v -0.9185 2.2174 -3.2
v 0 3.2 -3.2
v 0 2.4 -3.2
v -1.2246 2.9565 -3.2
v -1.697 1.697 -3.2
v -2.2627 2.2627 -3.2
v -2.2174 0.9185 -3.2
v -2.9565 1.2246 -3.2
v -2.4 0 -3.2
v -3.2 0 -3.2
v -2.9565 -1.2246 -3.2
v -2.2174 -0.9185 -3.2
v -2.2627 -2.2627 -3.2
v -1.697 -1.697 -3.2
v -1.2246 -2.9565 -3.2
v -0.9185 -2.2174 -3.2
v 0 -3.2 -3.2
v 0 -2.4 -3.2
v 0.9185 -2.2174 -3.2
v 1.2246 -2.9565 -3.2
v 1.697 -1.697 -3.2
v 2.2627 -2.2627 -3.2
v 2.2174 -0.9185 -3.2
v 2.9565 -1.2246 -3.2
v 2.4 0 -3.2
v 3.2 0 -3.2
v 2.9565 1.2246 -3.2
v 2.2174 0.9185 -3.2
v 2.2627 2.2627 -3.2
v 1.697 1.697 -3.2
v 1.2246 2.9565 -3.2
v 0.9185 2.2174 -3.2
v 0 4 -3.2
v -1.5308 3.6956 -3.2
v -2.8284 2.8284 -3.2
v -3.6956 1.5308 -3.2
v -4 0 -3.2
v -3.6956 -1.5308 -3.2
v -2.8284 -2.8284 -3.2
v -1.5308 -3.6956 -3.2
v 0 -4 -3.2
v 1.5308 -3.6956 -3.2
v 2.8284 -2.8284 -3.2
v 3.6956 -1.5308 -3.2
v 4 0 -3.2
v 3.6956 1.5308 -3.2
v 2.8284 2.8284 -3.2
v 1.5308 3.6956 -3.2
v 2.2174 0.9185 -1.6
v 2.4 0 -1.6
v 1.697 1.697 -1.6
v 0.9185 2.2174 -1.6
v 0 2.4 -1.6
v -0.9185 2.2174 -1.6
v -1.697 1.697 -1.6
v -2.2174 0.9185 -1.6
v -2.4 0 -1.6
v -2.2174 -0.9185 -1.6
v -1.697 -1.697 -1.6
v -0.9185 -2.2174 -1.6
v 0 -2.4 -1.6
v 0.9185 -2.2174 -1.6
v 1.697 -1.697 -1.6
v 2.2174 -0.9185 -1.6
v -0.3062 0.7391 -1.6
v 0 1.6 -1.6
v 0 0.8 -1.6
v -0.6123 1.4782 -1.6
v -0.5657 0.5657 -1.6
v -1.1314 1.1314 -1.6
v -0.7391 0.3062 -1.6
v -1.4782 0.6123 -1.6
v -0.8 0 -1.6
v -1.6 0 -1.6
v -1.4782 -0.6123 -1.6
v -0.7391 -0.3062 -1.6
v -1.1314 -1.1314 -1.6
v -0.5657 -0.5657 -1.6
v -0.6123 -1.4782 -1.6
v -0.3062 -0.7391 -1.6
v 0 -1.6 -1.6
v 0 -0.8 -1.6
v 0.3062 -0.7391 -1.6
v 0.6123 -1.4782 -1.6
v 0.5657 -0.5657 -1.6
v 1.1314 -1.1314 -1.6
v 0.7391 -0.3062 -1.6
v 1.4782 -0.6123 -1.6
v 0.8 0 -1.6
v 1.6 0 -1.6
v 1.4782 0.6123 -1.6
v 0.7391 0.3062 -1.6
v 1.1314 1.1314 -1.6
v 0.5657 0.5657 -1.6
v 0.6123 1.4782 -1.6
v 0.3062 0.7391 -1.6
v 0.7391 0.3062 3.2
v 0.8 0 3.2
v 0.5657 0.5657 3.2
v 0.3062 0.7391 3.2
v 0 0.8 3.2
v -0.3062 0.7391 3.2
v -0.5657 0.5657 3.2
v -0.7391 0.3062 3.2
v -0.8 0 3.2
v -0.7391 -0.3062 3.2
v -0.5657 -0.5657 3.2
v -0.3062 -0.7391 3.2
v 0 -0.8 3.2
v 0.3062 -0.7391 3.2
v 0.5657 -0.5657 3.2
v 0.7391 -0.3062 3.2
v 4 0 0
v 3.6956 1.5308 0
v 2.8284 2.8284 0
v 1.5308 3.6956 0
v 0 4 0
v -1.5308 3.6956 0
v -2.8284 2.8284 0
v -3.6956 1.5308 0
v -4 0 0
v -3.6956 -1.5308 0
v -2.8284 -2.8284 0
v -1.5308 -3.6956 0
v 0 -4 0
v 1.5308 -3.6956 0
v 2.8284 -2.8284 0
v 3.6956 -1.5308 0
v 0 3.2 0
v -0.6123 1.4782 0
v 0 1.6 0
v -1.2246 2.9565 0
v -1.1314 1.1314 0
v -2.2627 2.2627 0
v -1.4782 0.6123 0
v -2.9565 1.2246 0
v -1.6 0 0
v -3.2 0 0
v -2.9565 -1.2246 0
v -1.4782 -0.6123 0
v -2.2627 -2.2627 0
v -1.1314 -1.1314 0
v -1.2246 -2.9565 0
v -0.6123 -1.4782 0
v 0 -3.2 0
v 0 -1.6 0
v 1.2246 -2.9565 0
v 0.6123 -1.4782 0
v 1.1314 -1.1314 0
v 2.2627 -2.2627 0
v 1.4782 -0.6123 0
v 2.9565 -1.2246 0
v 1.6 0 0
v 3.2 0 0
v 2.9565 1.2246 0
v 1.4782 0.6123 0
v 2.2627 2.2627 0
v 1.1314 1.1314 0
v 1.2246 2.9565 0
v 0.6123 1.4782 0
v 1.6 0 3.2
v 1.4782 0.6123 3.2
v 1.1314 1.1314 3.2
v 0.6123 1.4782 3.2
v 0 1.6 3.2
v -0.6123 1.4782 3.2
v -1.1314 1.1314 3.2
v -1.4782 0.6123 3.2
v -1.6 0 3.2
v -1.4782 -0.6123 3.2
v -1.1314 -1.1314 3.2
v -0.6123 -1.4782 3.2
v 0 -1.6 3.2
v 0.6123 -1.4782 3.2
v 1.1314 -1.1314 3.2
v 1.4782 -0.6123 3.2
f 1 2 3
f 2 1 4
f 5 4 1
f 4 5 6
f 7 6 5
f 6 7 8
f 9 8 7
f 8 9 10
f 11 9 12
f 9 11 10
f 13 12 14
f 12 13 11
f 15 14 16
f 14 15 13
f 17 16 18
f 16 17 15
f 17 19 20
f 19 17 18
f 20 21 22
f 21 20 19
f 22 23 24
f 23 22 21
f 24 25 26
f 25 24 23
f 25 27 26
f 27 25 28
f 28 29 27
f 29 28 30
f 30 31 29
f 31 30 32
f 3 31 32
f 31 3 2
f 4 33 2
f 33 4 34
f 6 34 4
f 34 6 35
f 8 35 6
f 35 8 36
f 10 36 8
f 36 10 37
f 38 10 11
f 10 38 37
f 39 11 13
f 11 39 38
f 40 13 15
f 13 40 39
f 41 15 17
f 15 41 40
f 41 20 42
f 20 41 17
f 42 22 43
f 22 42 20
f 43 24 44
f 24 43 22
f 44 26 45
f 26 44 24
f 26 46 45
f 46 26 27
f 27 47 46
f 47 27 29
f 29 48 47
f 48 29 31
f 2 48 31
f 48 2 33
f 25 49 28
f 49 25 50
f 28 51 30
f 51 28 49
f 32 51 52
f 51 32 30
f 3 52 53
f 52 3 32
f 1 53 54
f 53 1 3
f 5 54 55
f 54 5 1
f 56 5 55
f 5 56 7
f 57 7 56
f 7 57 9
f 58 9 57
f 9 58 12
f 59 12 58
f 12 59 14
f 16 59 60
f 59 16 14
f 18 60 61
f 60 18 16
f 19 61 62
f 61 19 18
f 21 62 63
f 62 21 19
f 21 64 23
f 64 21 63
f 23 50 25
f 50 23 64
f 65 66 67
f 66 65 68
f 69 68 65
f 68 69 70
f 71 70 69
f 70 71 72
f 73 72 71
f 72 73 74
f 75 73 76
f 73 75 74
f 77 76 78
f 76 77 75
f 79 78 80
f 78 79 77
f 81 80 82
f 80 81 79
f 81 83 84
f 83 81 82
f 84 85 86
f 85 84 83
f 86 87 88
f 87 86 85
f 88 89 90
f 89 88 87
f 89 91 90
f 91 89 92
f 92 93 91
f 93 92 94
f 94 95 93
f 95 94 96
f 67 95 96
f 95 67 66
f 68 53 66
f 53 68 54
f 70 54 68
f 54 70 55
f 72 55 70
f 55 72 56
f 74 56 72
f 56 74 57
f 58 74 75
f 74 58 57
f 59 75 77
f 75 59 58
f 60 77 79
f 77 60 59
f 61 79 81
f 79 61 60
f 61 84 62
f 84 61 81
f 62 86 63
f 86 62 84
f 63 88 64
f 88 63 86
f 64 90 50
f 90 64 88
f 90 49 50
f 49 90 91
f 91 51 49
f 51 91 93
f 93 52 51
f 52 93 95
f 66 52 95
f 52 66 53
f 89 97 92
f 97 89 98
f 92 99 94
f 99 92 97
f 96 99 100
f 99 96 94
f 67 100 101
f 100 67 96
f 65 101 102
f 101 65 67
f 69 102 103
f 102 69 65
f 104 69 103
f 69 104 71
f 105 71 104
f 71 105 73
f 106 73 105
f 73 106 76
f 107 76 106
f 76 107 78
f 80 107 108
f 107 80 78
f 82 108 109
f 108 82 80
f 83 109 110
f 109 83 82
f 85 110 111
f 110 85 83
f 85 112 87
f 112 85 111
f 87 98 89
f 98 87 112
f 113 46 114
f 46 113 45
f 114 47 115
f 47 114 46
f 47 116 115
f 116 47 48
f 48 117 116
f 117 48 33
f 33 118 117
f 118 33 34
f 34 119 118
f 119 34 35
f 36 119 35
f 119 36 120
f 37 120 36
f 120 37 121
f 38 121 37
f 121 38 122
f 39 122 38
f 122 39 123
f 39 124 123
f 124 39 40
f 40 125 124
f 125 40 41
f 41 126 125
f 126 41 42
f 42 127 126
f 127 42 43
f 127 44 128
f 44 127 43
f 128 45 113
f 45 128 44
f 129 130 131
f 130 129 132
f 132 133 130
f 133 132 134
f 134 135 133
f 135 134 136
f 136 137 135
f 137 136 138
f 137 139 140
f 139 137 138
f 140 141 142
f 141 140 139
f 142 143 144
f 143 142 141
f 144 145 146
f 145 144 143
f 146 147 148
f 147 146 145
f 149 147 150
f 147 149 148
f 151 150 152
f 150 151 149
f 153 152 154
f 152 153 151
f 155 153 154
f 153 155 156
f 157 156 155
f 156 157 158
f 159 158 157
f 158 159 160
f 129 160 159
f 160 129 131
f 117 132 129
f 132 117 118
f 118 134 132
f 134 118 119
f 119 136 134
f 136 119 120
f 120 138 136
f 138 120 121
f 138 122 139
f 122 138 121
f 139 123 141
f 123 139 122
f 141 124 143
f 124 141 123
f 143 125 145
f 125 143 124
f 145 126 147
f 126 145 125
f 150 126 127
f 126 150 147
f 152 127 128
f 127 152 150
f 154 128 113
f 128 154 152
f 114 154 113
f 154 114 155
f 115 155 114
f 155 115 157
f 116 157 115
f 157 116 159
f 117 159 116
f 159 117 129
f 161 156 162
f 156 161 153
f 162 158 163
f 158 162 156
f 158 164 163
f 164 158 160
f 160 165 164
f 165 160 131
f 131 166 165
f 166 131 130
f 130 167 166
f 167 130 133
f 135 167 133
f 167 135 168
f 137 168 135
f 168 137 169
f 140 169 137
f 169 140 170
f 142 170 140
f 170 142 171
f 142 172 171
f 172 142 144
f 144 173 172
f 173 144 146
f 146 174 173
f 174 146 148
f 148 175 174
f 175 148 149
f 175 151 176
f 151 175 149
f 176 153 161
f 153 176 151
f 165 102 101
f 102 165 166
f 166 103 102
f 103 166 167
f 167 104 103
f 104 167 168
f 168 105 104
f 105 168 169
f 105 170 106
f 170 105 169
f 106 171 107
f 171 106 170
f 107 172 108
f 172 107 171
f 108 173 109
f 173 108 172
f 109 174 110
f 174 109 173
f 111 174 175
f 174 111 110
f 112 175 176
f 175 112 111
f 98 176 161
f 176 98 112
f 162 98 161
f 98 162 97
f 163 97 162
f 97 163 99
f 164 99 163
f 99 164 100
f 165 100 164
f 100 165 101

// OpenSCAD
// file: ../p/4-4edge.scad
use <../lib.scad>
function ldraw_lib__4_4edge() = [
// 0 Circle 1.0
// 0 Name: 4-4edge.dat
// 0 Author: James Jessiman
// 0 !LDRAW_ORG Primitive UPDATE 2017-01
// 0 !LICENSE Licensed under CC BY 2.0 and CC BY 4.0 : see CAreadme.txt
// 
// 0 BFC CERTIFY CCW
  [0,"BFC","CERTIFY"],
  [0,"BFC","CCW"],
// 
// 0 !HISTORY 1998-12-15 [PTadmin] Official Update 1998-10
// 0 !HISTORY 2005-12-28 [PTadmin] Official Update 2005-01
// 0 !HISTORY 2007-06-24 [PTadmin] Header formatted for Contributor Agreement
// 0 !HISTORY 2008-07-01 [PTadmin] Official Update 2008-01
// 0 !HISTORY 2017-01-15 [Steffen] BFCed
// 0 !HISTORY 2017-12-30 [PTadmin] Official Update 2017-01
// 
// 
// 2 24 1 0 0 0.9239 0 0.3827
  [2,24,1,0,0,0.9239,0,0.3827],
// 2 24 0.9239 0 0.3827 0.7071 0 0.7071
  [2,24,0.9239,0,0.3827,0.7071,0,0.7071],
// 2 24 0.7071 0 0.7071 0.3827 0 0.9239
  [2,24,0.7071,0,0.7071,0.3827,0,0.9239],
// 2 24 0.3827 0 0.9239 0 0 1
  [2,24,0.3827,0,0.9239,0,0,1],
// 2 24 0 0 1 -0.3827 0 0.9239
  [2,24,0,0,1,-0.3827,0,0.9239],
// 2 24 -0.3827 0 0.9239 -0.7071 0 0.7071
  [2,24,-0.3827,0,0.9239,-0.7071,0,0.7071],
// 2 24 -0.7071 0 0.7071 -0.9239 0 0.3827
  [2,24,-0.7071,0,0.7071,-0.9239,0,0.3827],
// 2 24 -0.9239 0 0.3827 -1 0 -0
  [2,24,-0.9239,0,0.3827,-1,0,-0],
// 2 24 -1 0 -0 -0.9239 0 -0.3827
  [2,24,-1,0,-0,-0.9239,0,-0.3827],
// 2 24 -0.9239 0 -0.3827 -0.7071 0 -0.7071
  [2,24,-0.9239,0,-0.3827,-0.7071,0,-0.7071],
// 2 24 -0.7071 0 -0.7071 -0.3827 0 -0.9239
  [2,24,-0.7071,0,-0.7071,-0.3827,0,-0.9239],
// 2 24 -0.3827 0 -0.9239 0 0 -1
  [2,24,-0.3827,0,-0.9239,0,0,-1],
// 2 24 0 0 -1 0.3827 0 -0.9239
  [2,24,0,0,-1,0.3827,0,-0.9239],
// 2 24 0.3827 0 -0.9239 0.7071 0 -0.7071
  [2,24,0.3827,0,-0.9239,0.7071,0,-0.7071],
// 2 24 0.7071 0 -0.7071 0.9239 0 -0.3827
  [2,24,0.7071,0,-0.7071,0.9239,0,-0.3827],
// 2 24 0.9239 0 -0.3827 1 0 0
  [2,24,0.9239,0,-0.3827,1,0,0],
];
makepoly(ldraw_lib__4_4edge(), line=0.2);
// file: ../p/4-4cyli.scad
use <../lib.scad>
function ldraw_lib__4_4cyli() = [
// 0 Cylinder 1.0
// 0 Name: 4-4cyli.dat
// 0 Author: James Jessiman
// 0 !LDRAW_ORG Primitive UPDATE 2005-01
// 0 !LICENSE Licensed under CC BY 2.0 and CC BY 4.0 : see CAreadme.txt
// 
// 0 BFC CERTIFY CCW
  [0,"BFC","CERTIFY"],
  [0,"BFC","CCW"],
// 
// 0 !HISTORY 1998-12-15 [PTadmin] Official Update 1998-10
// 0 !HISTORY 2002-03-23 [sbliss] Added BFC statement; merged headers from files in distributions LDraw 0.27 and Complete.
// 0 !HISTORY 2002-04-25 [PTadmin] Official Update 2002-02
// 0 !HISTORY 2004-12-14 [guyvivan] BFC CCW
// 0 !HISTORY 2005-12-28 [PTadmin] Official Update 2005-01
// 0 !HISTORY 2007-06-24 [PTadmin] Header formatted for Contributor Agreement
// 0 !HISTORY 2008-07-01 [PTadmin] Official Update 2008-01
// 
// 
// 4 16 1 1 0 0.9239 1 0.3827 0.9239 0 0.3827 1 0 0
  [4,16,1,1,0,0.9239,1,0.3827,0.9239,0,0.3827,1,0,0],
// 5 24 1 0 0 1 1 0 0.9239 0 0.3827 0.9239 0 -0.3827
  [5,24,1,0,0,1,1,0,0.9239,0,0.3827,0.9239,0,-0.3827],
// 4 16 0.9239 1 0.3827 0.7071 1 0.7071 0.7071 0 0.7071 0.9239 0 0.3827
  [4,16,0.9239,1,0.3827,0.7071,1,0.7071,0.7071,0,0.7071,0.9239,0,0.3827],
// 5 24 0.9239 0 0.3827 0.9239 1 0.3827 0.7071 0 0.7071 1 0 0
  [5,24,0.9239,0,0.3827,0.9239,1,0.3827,0.7071,0,0.7071,1,0,0],
// 4 16 0.7071 1 0.7071 0.3827 1 0.9239 0.3827 0 0.9239 0.7071 0 0.7071
  [4,16,0.7071,1,0.7071,0.3827,1,0.9239,0.3827,0,0.9239,0.7071,0,0.7071],
// 5 24 0.7071 0 0.7071 0.7071 1 0.7071 0.3827 0 0.9239 0.9239 0 0.3827
  [5,24,0.7071,0,0.7071,0.7071,1,0.7071,0.3827,0,0.9239,0.9239,0,0.3827],
// 4 16 0.3827 1 0.9239 0 1 1 0 0 1 0.3827 0 0.9239
  [4,16,0.3827,1,0.9239,0,1,1,0,0,1,0.3827,0,0.9239],
// 5 24 0.3827 0 0.9239 0.3827 1 0.9239 0 0 1 0.7071 0 0.7071
  [5,24,0.3827,0,0.9239,0.3827,1,0.9239,0,0,1,0.7071,0,0.7071],
// 4 16 0 1 1 -0.3827 1 0.9239 -0.3827 0 0.9239 0 0 1
  [4,16,0,1,1,-0.3827,1,0.9239,-0.3827,0,0.9239,0,0,1],
// 5 24 0 0 1 0 1 1 -0.3827 0 0.9239 0.3827 0 0.9239
  [5,24,0,0,1,0,1,1,-0.3827,0,0.9239,0.3827,0,0.9239],
// 4 16 -0.3827 1 0.9239 -0.7071 1 0.7071 -0.7071 0 0.7071 -0.3827 0 0.9239
  [4,16,-0.3827,1,0.9239,-0.7071,1,0.7071,-0.7071,0,0.7071,-0.3827,0,0.9239],
// 5 24 -0.3827 0 0.9239 -0.3827 1 0.9239 -0.7071 0 0.7071 0 0 1
  [5,24,-0.3827,0,0.9239,-0.3827,1,0.9239,-0.7071,0,0.7071,0,0,1],
// 4 16 -0.7071 1 0.7071 -0.9239 1 0.3827 -0.9239 0 0.3827 -0.7071 0 0.7071
  [4,16,-0.7071,1,0.7071,-0.9239,1,0.3827,-0.9239,0,0.3827,-0.7071,0,0.7071],
// 5 24 -0.7071 0 0.7071 -0.7071 1 0.7071 -0.9239 0 0.3827 -0.3827 0 0.9239
  [5,24,-0.7071,0,0.7071,-0.7071,1,0.7071,-0.9239,0,0.3827,-0.3827,0,0.9239],
// 4 16 -0.9239 1 0.3827 -1 1 0 -1 0 0 -0.9239 0 0.3827
  [4,16,-0.9239,1,0.3827,-1,1,0,-1,0,0,-0.9239,0,0.3827],
// 5 24 -0.9239 0 0.3827 -0.9239 1 0.3827 -1 0 0 -0.7071 0 0.7071
  [5,24,-0.9239,0,0.3827,-0.9239,1,0.3827,-1,0,0,-0.7071,0,0.7071],
// 4 16 -1 1 0 -0.9239 1 -0.3827 -0.9239 0 -0.3827 -1 0 0
  [4,16,-1,1,0,-0.9239,1,-0.3827,-0.9239,0,-0.3827,-1,0,0],
// 5 24 -1 0 0 -1 1 0 -0.9239 0 -0.3827 -0.9239 0 0.3827
  [5,24,-1,0,0,-1,1,0,-0.9239,0,-0.3827,-0.9239,0,0.3827],
// 4 16 -0.9239 1 -0.3827 -0.7071 1 -0.7071 -0.7071 0 -0.7071 -0.9239 0 -0.3827
  [4,16,-0.9239,1,-0.3827,-0.7071,1,-0.7071,-0.7071,0,-0.7071,-0.9239,0,-0.3827],
// 5 24 -0.9239 0 -0.3827 -0.9239 1 -0.3827 -0.7071 0 -0.7071 -1 0 0
  [5,24,-0.9239,0,-0.3827,-0.9239,1,-0.3827,-0.7071,0,-0.7071,-1,0,0],
// 4 16 -0.7071 1 -0.7071 -0.3827 1 -0.9239 -0.3827 0 -0.9239 -0.7071 0 -0.7071
  [4,16,-0.7071,1,-0.7071,-0.3827,1,-0.9239,-0.3827,0,-0.9239,-0.7071,0,-0.7071],
// 5 24 -0.7071 0 -0.7071 -0.7071 1 -0.7071 -0.3827 0 -0.9239 -0.9239 0 -0.3827
  [5,24,-0.7071,0,-0.7071,-0.7071,1,-0.7071,-0.3827,0,-0.9239,-0.9239,0,-0.3827],
// 4 16 -0.3827 1 -0.9239 0 1 -1 0 0 -1 -0.3827 0 -0.9239
  [4,16,-0.3827,1,-0.9239,0,1,-1,0,0,-1,-0.3827,0,-0.9239],
// 5 24 -0.3827 0 -0.9239 -0.3827 1 -0.9239 0 0 -1 -0.7071 0 -0.7071
  [5,24,-0.3827,0,-0.9239,-0.3827,1,-0.9239,0,0,-1,-0.7071,0,-0.7071],
// 4 16 0 1 -1 0.3827 1 -0.9239 0.3827 0 -0.9239 0 0 -1
  [4,16,0,1,-1,0.3827,1,-0.9239,0.3827,0,-0.9239,0,0,-1],
// 5 24 0 0 -1 0 1 -1 0.3827 0 -0.9239 -0.3827 0 -0.9239
  [5,24,0,0,-1,0,1,-1,0.3827,0,-0.9239,-0.3827,0,-0.9239],
// 4 16 0.3827 1 -0.9239 0.7071 1 -0.7071 0.7071 0 -0.7071 0.3827 0 -0.9239
  [4,16,0.3827,1,-0.9239,0.7071,1,-0.7071,0.7071,0,-0.7071,0.3827,0,-0.9239],
// 5 24 0.3827 0 -0.9239 0.3827 1 -0.9239 0.7071 0 -0.7071 0 0 -1
  [5,24,0.3827,0,-0.9239,0.3827,1,-0.9239,0.7071,0,-0.7071,0,0,-1],
// 4 16 0.7071 1 -0.7071 0.9239 1 -0.3827 0.9239 0 -0.3827 0.7071 0 -0.7071
  [4,16,0.7071,1,-0.7071,0.9239,1,-0.3827,0.9239,0,-0.3827,0.7071,0,-0.7071],
// 5 24 0.7071 0 -0.7071 0.7071 1 -0.7071 0.9239 0 -0.3827 0.3827 0 -0.9239
  [5,24,0.7071,0,-0.7071,0.7071,1,-0.7071,0.9239,0,-0.3827,0.3827,0,-0.9239],
// 4 16 0.9239 1 -0.3827 1 1 0 1 0 0 0.9239 0 -0.3827
  [4,16,0.9239,1,-0.3827,1,1,0,1,0,0,0.9239,0,-0.3827],
// 5 24 0.9239 0 -0.3827 0.9239 1 -0.3827 1 0 0 0.7071 0 -0.7071
  [5,24,0.9239,0,-0.3827,0.9239,1,-0.3827,1,0,0,0.7071,0,-0.7071],
// 0
];
makepoly(ldraw_lib__4_4cyli(), line=0.2);
// file: ../p/4-4ring4.scad
use <../lib.scad>
function ldraw_lib__4_4ring4() = [
// 0 Ring  4 x 1.0
// 0 Name: 4-4ring4.dat
// 0 Author: James Jessiman
// 0 !LDRAW_ORG Primitive UPDATE 2009-01
// 0 !LICENSE Licensed under CC BY 2.0 and CC BY 4.0 : see CAreadme.txt
// 
// 0 BFC CERTIFY CCW
  [0,"BFC","CERTIFY"],
  [0,"BFC","CCW"],
// 
// 0 !HISTORY 1998-12-15 [PTadmin] Official Update 1998-10
// 0 !HISTORY 2002-04-08 [BrickCaster] Modified for BFC compliance
// 0 !HISTORY 2002-04-25 [PTadmin] Official Update 2002-02
// 0 !HISTORY 2007-06-24 [PTadmin] Header formatted for Contributor Agreement
// 0 !HISTORY 2008-07-01 [PTadmin] Official Update 2008-01
// 0 !HISTORY 2008-08-26 [cwdee] Switch polygon winding and rename
// 0 !HISTORY 2009-05-02 [PTadmin] Official Update 2009-01
// 
// 
// 4 16 -1.9135 0 4.6195 -1.5308 0 3.6956 0 0 4 0 0 5
  [4,16,-1.9135,0,4.6195,-1.5308,0,3.6956,0,0,4,0,0,5],
// 4 16 -3.5355 0 3.5355 -2.8284 0 2.8284 -1.5308 0 3.6956 -1.9135 0 4.6195
  [4,16,-3.5355,0,3.5355,-2.8284,0,2.8284,-1.5308,0,3.6956,-1.9135,0,4.6195],
// 4 16 -4.6195 0 1.9135 -3.6956 0 1.5308 -2.8284 0 2.8284 -3.5355 0 3.5355
  [4,16,-4.6195,0,1.9135,-3.6956,0,1.5308,-2.8284,0,2.8284,-3.5355,0,3.5355],
// 4 16 -5 0 0 -4 0 0 -3.6956 0 1.5308 -4.6195 0 1.9135
  [4,16,-5,0,0,-4,0,0,-3.6956,0,1.5308,-4.6195,0,1.9135],
// 4 16 -4.6195 0 -1.9135 -3.6956 0 -1.5308 -4 0 0 -5 0 0
  [4,16,-4.6195,0,-1.9135,-3.6956,0,-1.5308,-4,0,0,-5,0,0],
// 4 16 -3.5355 0 -3.5355 -2.8284 0 -2.8284 -3.6956 0 -1.5308 -4.6195 0 -1.9135
  [4,16,-3.5355,0,-3.5355,-2.8284,0,-2.8284,-3.6956,0,-1.5308,-4.6195,0,-1.9135],
// 4 16 -1.9135 0 -4.6195 -1.5308 0 -3.6956 -2.8284 0 -2.8284 -3.5355 0 -3.5355
  [4,16,-1.9135,0,-4.6195,-1.5308,0,-3.6956,-2.8284,0,-2.8284,-3.5355,0,-3.5355],
// 4 16 0 0 -5 0 0 -4 -1.5308 0 -3.6956 -1.9135 0 -4.6195
  [4,16,0,0,-5,0,0,-4,-1.5308,0,-3.6956,-1.9135,0,-4.6195],
// 4 16 1.9135 0 -4.6195 1.5308 0 -3.6956 0 0 -4 0 0 -5
  [4,16,1.9135,0,-4.6195,1.5308,0,-3.6956,0,0,-4,0,0,-5],
// 4 16 3.5355 0 -3.5355 2.8284 0 -2.8284 1.5308 0 -3.6956 1.9135 0 -4.6195
  [4,16,3.5355,0,-3.5355,2.8284,0,-2.8284,1.5308,0,-3.6956,1.9135,0,-4.6195],
// 4 16 4.6195 0 -1.9135 3.6956 0 -1.5308 2.8284 0 -2.8284 3.5355 0 -3.5355
  [4,16,4.6195,0,-1.9135,3.6956,0,-1.5308,2.8284,0,-2.8284,3.5355,0,-3.5355],
// 4 16 5 0 0 4 0 0 3.6956 0 -1.5308 4.6195 0 -1.9135
  [4,16,5,0,0,4,0,0,3.6956,0,-1.5308,4.6195,0,-1.9135],
// 4 16 4.6195 0 1.9135 3.6956 0 1.5308 4 0 0 5 0 0
  [4,16,4.6195,0,1.9135,3.6956,0,1.5308,4,0,0,5,0,0],
// 4 16 3.5355 0 3.5355 2.8284 0 2.8284 3.6956 0 1.5308 4.6195 0 1.9135
  [4,16,3.5355,0,3.5355,2.8284,0,2.8284,3.6956,0,1.5308,4.6195,0,1.9135],
// 4 16 1.9135 0 4.6195 1.5308 0 3.6956 2.8284 0 2.8284 3.5355 0 3.5355
  [4,16,1.9135,0,4.6195,1.5308,0,3.6956,2.8284,0,2.8284,3.5355,0,3.5355],
// 4 16 0 0 5 0 0 4 1.5308 0 3.6956 1.9135 0 4.6195
  [4,16,0,0,5,0,0,4,1.5308,0,3.6956,1.9135,0,4.6195],
// 0
];
makepoly(ldraw_lib__4_4ring4(), line=0.2);
// file: ../p/4-4ring3.scad
use <../lib.scad>
function ldraw_lib__4_4ring3() = [
// 0 Ring  3 x 1.0
// 0 Name: 4-4ring3.dat
// 0 Author: James Jessiman
// 0 !LDRAW_ORG Primitive UPDATE 2009-01
// 0 !LICENSE Licensed under CC BY 2.0 and CC BY 4.0 : see CAreadme.txt
// 
// 0 BFC CERTIFY CCW
  [0,"BFC","CERTIFY"],
  [0,"BFC","CCW"],
// 
// 0 !HISTORY 1998-12-15 [PTadmin] Official Update 1998-10
// 0 !HISTORY 2002-04-05 [hafhead] Added BFC statement
// 0 !HISTORY 2002-04-25 [PTadmin] Official Update 2002-02
// 0 !HISTORY 2007-06-24 [PTadmin] Header formatted for Contributor Agreement
// 0 !HISTORY 2008-07-01 [PTadmin] Official Update 2008-01
// 0 !HISTORY 2008-08-26 [cwdee] Switch polygon winding and rename
// 0 !HISTORY 2009-05-02 [PTadmin] Official Update 2009-01
// 
// 
// 4 16 -1.5308 0 3.6956 -1.1481 0 2.7717 0 0 3 0 0 4
  [4,16,-1.5308,0,3.6956,-1.1481,0,2.7717,0,0,3,0,0,4],
// 4 16 -2.8284 0 2.8284 -2.1213 0 2.1213 -1.1481 0 2.7717 -1.5308 0 3.6956
  [4,16,-2.8284,0,2.8284,-2.1213,0,2.1213,-1.1481,0,2.7717,-1.5308,0,3.6956],
// 4 16 -3.6956 0 1.5308 -2.7717 0 1.1481 -2.1213 0 2.1213 -2.8284 0 2.8284
  [4,16,-3.6956,0,1.5308,-2.7717,0,1.1481,-2.1213,0,2.1213,-2.8284,0,2.8284],
// 4 16 -4 0 0 -3 0 0 -2.7717 0 1.1481 -3.6956 0 1.5308
  [4,16,-4,0,0,-3,0,0,-2.7717,0,1.1481,-3.6956,0,1.5308],
// 4 16 -3.6956 0 -1.5308 -2.7717 0 -1.1481 -3 0 0 -4 0 0
  [4,16,-3.6956,0,-1.5308,-2.7717,0,-1.1481,-3,0,0,-4,0,0],
// 4 16 -2.8284 0 -2.8284 -2.1213 0 -2.1213 -2.7717 0 -1.1481 -3.6956 0 -1.5308
  [4,16,-2.8284,0,-2.8284,-2.1213,0,-2.1213,-2.7717,0,-1.1481,-3.6956,0,-1.5308],
// 4 16 -1.5308 0 -3.6956 -1.1481 0 -2.7717 -2.1213 0 -2.1213 -2.8284 0 -2.8284
  [4,16,-1.5308,0,-3.6956,-1.1481,0,-2.7717,-2.1213,0,-2.1213,-2.8284,0,-2.8284],
// 4 16 0 0 -4 0 0 -3 -1.1481 0 -2.7717 -1.5308 0 -3.6956
  [4,16,0,0,-4,0,0,-3,-1.1481,0,-2.7717,-1.5308,0,-3.6956],
// 4 16 1.5308 0 -3.6956 1.1481 0 -2.7717 0 0 -3 0 0 -4
  [4,16,1.5308,0,-3.6956,1.1481,0,-2.7717,0,0,-3,0,0,-4],
// 4 16 2.8284 0 -2.8284 2.1213 0 -2.1213 1.1481 0 -2.7717 1.5308 0 -3.6956
  [4,16,2.8284,0,-2.8284,2.1213,0,-2.1213,1.1481,0,-2.7717,1.5308,0,-3.6956],
// 4 16 3.6956 0 -1.5308 2.7717 0 -1.1481 2.1213 0 -2.1213 2.8284 0 -2.8284
  [4,16,3.6956,0,-1.5308,2.7717,0,-1.1481,2.1213,0,-2.1213,2.8284,0,-2.8284],
// 4 16 4 0 0 3 0 0 2.7717 0 -1.1481 3.6956 0 -1.5308
  [4,16,4,0,0,3,0,0,2.7717,0,-1.1481,3.6956,0,-1.5308],
// 4 16 3.6956 0 1.5308 2.7717 0 1.1481 3 0 0 4 0 0
  [4,16,3.6956,0,1.5308,2.7717,0,1.1481,3,0,0,4,0,0],
// 4 16 2.8284 0 2.8284 2.1213 0 2.1213 2.7717 0 1.1481 3.6956 0 1.5308
  [4,16,2.8284,0,2.8284,2.1213,0,2.1213,2.7717,0,1.1481,3.6956,0,1.5308],
// 4 16 1.5308 0 3.6956 1.1481 0 2.7717 2.1213 0 2.1213 2.8284 0 2.8284
  [4,16,1.5308,0,3.6956,1.1481,0,2.7717,2.1213,0,2.1213,2.8284,0,2.8284],
// 4 16 0 0 4 0 0 3 1.1481 0 2.7717 1.5308 0 3.6956
  [4,16,0,0,4,0,0,3,1.1481,0,2.7717,1.5308,0,3.6956],
// 0
];
makepoly(ldraw_lib__4_4ring3(), line=0.2);
// file: ../p/4-4ring2.scad
use <../lib.scad>
function ldraw_lib__4_4ring2() = [
// 0 Ring  2 x 1.0
// 0 Name: 4-4ring2.dat
// 0 Author: James Jessiman
// 0 !LDRAW_ORG Primitive UPDATE 2009-01
// 0 !LICENSE Licensed under CC BY 2.0 and CC BY 4.0 : see CAreadme.txt
// 
// 0 BFC CERTIFY CCW
  [0,"BFC","CERTIFY"],
  [0,"BFC","CCW"],
// 
// 0 !HISTORY 1998-12-15 [PTadmin] Official Update 1998-10
// 0 !HISTORY 2002-04-05 [hafhead] Added BFC statement
// 0 !HISTORY 2002-04-25 [PTadmin] Official Update 2002-02
// 0 !HISTORY 2007-06-24 [PTadmin] Header formatted for Contributor Agreement
// 0 !HISTORY 2008-07-01 [PTadmin] Official Update 2008-01
// 0 !HISTORY 2008-08-26 [cwdee] Switch polygon winding and rename
// 0 !HISTORY 2009-05-02 [PTadmin] Official Update 2009-01
// 
// 
// 4 16 -1.1481 0 2.7717 -0.7654 0 1.8478 0 0 2 0 0 3
  [4,16,-1.1481,0,2.7717,-0.7654,0,1.8478,0,0,2,0,0,3],
// 4 16 -2.1213 0 2.1213 -1.4142 0 1.4142 -0.7654 0 1.8478 -1.1481 0 2.7717
  [4,16,-2.1213,0,2.1213,-1.4142,0,1.4142,-0.7654,0,1.8478,-1.1481,0,2.7717],
// 4 16 -2.7717 0 1.1481 -1.8478 0 0.7654 -1.4142 0 1.4142 -2.1213 0 2.1213
  [4,16,-2.7717,0,1.1481,-1.8478,0,0.7654,-1.4142,0,1.4142,-2.1213,0,2.1213],
// 4 16 -3 0 0 -2 0 0 -1.8478 0 0.7654 -2.7717 0 1.1481
  [4,16,-3,0,0,-2,0,0,-1.8478,0,0.7654,-2.7717,0,1.1481],
// 4 16 -2.7717 0 -1.1481 -1.8478 0 -0.7654 -2 0 0 -3 0 0
  [4,16,-2.7717,0,-1.1481,-1.8478,0,-0.7654,-2,0,0,-3,0,0],
// 4 16 -2.1213 0 -2.1213 -1.4142 0 -1.4142 -1.8478 0 -0.7654 -2.7717 0 -1.1481
  [4,16,-2.1213,0,-2.1213,-1.4142,0,-1.4142,-1.8478,0,-0.7654,-2.7717,0,-1.1481],
// 4 16 -1.1481 0 -2.7717 -0.7654 0 -1.8478 -1.4142 0 -1.4142 -2.1213 0 -2.1213
  [4,16,-1.1481,0,-2.7717,-0.7654,0,-1.8478,-1.4142,0,-1.4142,-2.1213,0,-2.1213],
// 4 16 0 0 -3 0 0 -2 -0.7654 0 -1.8478 -1.1481 0 -2.7717
  [4,16,0,0,-3,0,0,-2,-0.7654,0,-1.8478,-1.1481,0,-2.7717],
// 4 16 1.1481 0 -2.7717 0.7654 0 -1.8478 0 0 -2 0 0 -3
  [4,16,1.1481,0,-2.7717,0.7654,0,-1.8478,0,0,-2,0,0,-3],
// 4 16 2.1213 0 -2.1213 1.4142 0 -1.4142 0.7654 0 -1.8478 1.1481 0 -2.7717
  [4,16,2.1213,0,-2.1213,1.4142,0,-1.4142,0.7654,0,-1.8478,1.1481,0,-2.7717],
// 4 16 2.7717 0 -1.1481 1.8478 0 -0.7654 1.4142 0 -1.4142 2.1213 0 -2.1213
  [4,16,2.7717,0,-1.1481,1.8478,0,-0.7654,1.4142,0,-1.4142,2.1213,0,-2.1213],
// 4 16 3 0 0 2 0 0 1.8478 0 -0.7654 2.7717 0 -1.1481
  [4,16,3,0,0,2,0,0,1.8478,0,-0.7654,2.7717,0,-1.1481],
// 4 16 2.7717 0 1.1481 1.8478 0 0.7654 2 0 0 3 0 0
  [4,16,2.7717,0,1.1481,1.8478,0,0.7654,2,0,0,3,0,0],
// 4 16 2.1213 0 2.1213 1.4142 0 1.4142 1.8478 0 0.7654 2.7717 0 1.1481
  [4,16,2.1213,0,2.1213,1.4142,0,1.4142,1.8478,0,0.7654,2.7717,0,1.1481],
// 4 16 1.1481 0 2.7717 0.7654 0 1.8478 1.4142 0 1.4142 2.1213 0 2.1213
  [4,16,1.1481,0,2.7717,0.7654,0,1.8478,1.4142,0,1.4142,2.1213,0,2.1213],
// 4 16 0 0 3 0 0 2 0.7654 0 1.8478 1.1481 0 2.7717
  [4,16,0,0,3,0,0,2,0.7654,0,1.8478,1.1481,0,2.7717],
// 0
];
makepoly(ldraw_lib__4_4ring2(), line=0.2);
// file: ../p/4-4ring1.scad
use <../lib.scad>
function ldraw_lib__4_4ring1() = [
// 0 Ring  1 x 1.0
// 0 Name: 4-4ring1.dat
// 0 Author: James Jessiman
// 0 !LDRAW_ORG Primitive UPDATE 2009-01
// 0 !LICENSE Licensed under CC BY 2.0 and CC BY 4.0 : see CAreadme.txt
// 
// 0 BFC CERTIFY CCW
  [0,"BFC","CERTIFY"],
  [0,"BFC","CCW"],
// 
// 0 !HISTORY 1998-12-15 [PTadmin] Official Update 1998-10
// 0 !HISTORY 2002-04-08 [BrickCaster] Modified for BFC compliance
// 0 !HISTORY 2002-04-25 [PTadmin] Official Update 2002-02
// 0 !HISTORY 2007-06-24 [PTadmin] Header formatted for Contributor Agreement
// 0 !HISTORY 2008-07-01 [PTadmin] Official Update 2008-01
// 0 !HISTORY 2008-08-26 [cwdee] Switch polygon winding and rename
// 0 !HISTORY 2009-05-02 [PTadmin] Official Update 2009-01
// 
// 
// 4 16 -0.7654 0 1.8478 -0.3827 0 0.9239 0 0 1 0 0 2
  [4,16,-0.7654,0,1.8478,-0.3827,0,0.9239,0,0,1,0,0,2],
// 4 16 -1.4142 0 1.4142 -0.7071 0 0.7071 -0.3827 0 0.9239 -0.7654 0 1.8478
  [4,16,-1.4142,0,1.4142,-0.7071,0,0.7071,-0.3827,0,0.9239,-0.7654,0,1.8478],
// 4 16 -1.8478 0 0.7654 -0.9239 0 0.3827 -0.7071 0 0.7071 -1.4142 0 1.41420
  [4,16,-1.8478,0,0.7654,-0.9239,0,0.3827,-0.7071,0,0.7071,-1.4142,0,1.41420],
// 4 16 -2 0 0 -1 0 0 -0.9239 0 0.3827 -1.8478 0 0.7654
  [4,16,-2,0,0,-1,0,0,-0.9239,0,0.3827,-1.8478,0,0.7654],
// 4 16 -1.8478 0 -0.7654 -0.9239 0 -0.3827 -1 0 0 -2 0 0
  [4,16,-1.8478,0,-0.7654,-0.9239,0,-0.3827,-1,0,0,-2,0,0],
// 4 16 -1.4142 0 -1.4142 -0.7071 0 -0.7071 -0.9239 0 -0.3827 -1.8478 0 -0.7654
  [4,16,-1.4142,0,-1.4142,-0.7071,0,-0.7071,-0.9239,0,-0.3827,-1.8478,0,-0.7654],
// 4 16 -0.7654 0 -1.8478 -0.3827 0 -0.9239 -0.7071 0 -0.7071 -1.4142 0 -1.4142
  [4,16,-0.7654,0,-1.8478,-0.3827,0,-0.9239,-0.7071,0,-0.7071,-1.4142,0,-1.4142],
// 4 16 0 0 -2 0 0 -1 -0.3827 0 -0.9239 -0.7654 0 -1.8478
  [4,16,0,0,-2,0,0,-1,-0.3827,0,-0.9239,-0.7654,0,-1.8478],
// 4 16 0.7654 0 -1.8478 0.3827 0 -0.9239 0 0 -1 0 0 -2
  [4,16,0.7654,0,-1.8478,0.3827,0,-0.9239,0,0,-1,0,0,-2],
// 4 16 1.4142 0 -1.4142 0.7071 0 -0.7071 0.3827 0 -0.9239 0.7654 0 -1.8478
  [4,16,1.4142,0,-1.4142,0.7071,0,-0.7071,0.3827,0,-0.9239,0.7654,0,-1.8478],
// 4 16 1.8478 0 -0.7654 0.9239 0 -0.3827 0.7071 0 -0.7071 1.4142 0 -1.4142
  [4,16,1.8478,0,-0.7654,0.9239,0,-0.3827,0.7071,0,-0.7071,1.4142,0,-1.4142],
// 4 16 2 0 0 1 0 0 0.9239 0 -0.3827 1.8478 0 -0.7654
  [4,16,2,0,0,1,0,0,0.9239,0,-0.3827,1.8478,0,-0.7654],
// 4 16 1.8478 0 0.7654 0.9239 0 0.3827 1 0 0 2 0 0
  [4,16,1.8478,0,0.7654,0.9239,0,0.3827,1,0,0,2,0,0],
// 4 16 1.4142 0 1.4142 0.7071 0 0.7071 0.9239 0 0.3827 1.8478 0 0.7654
  [4,16,1.4142,0,1.4142,0.7071,0,0.7071,0.9239,0,0.3827,1.8478,0,0.7654],
// 4 16 0.7654 0 1.8478 0.3827 0 0.9239 0.7071 0 0.7071 1.4142 0 1.4142
  [4,16,0.7654,0,1.8478,0.3827,0,0.9239,0.7071,0,0.7071,1.4142,0,1.4142],
// 4 16 0 0 2 0 0 1 0.3827 0 0.9239 0.7654 0 1.8478
  [4,16,0,0,2,0,0,1,0.3827,0,0.9239,0.7654,0,1.8478],
// 0
];
makepoly(ldraw_lib__4_4ring1(), line=0.2);
// file: ../p/4-4cylo.scad
use <../lib.scad>
use <4-4cyli.scad>
use <4-4edge.scad>
function ldraw_lib__4_4cylo() = [
// 0 Cylinder Open 1.0
// 0 Name: 4-4cylo.dat
// 0 Author: Mark Kennedy [mkennedy]
// 0 !LDRAW_ORG Primitive UPDATE 2010-01
// 0 !LICENSE Licensed under CC BY 2.0 and CC BY 4.0 : see CAreadme.txt
// 
// 0 BFC CERTIFY CCW
  [0,"BFC","CERTIFY"],
  [0,"BFC","CCW"],
// 
// 0 !HISTORY 2010-04-05 [PTadmin] Official Update 2010-01
// 
// 
// 1 16 0 0 0 1 0 0 0 1 0 0 0 1 4-4edge.dat
  [1,16,0,0,0,1,0,0,0,1,0,0,0,1, ldraw_lib__4_4edge()],
// 1 16 0 1 0 1 0 0 0 1 0 0 0 1 4-4edge.dat
  [1,16,0,1,0,1,0,0,0,1,0,0,0,1, ldraw_lib__4_4edge()],
// 1 16 0 0 0 1 0 0 0 1 0 0 0 1 4-4cyli.dat
  [1,16,0,0,0,1,0,0,0,1,0,0,0,1, ldraw_lib__4_4cyli()],
// 0
];
makepoly(ldraw_lib__4_4cylo(), line=0.2);
// file: 20482.scad
use <../lib.scad>
use <../p/4-4cylo.scad>
use <../p/4-4ring1.scad>
use <../p/4-4ring2.scad>
use <../p/4-4ring3.scad>
use <../p/4-4ring4.scad>
function ldraw_lib__20482() = [
// 0 Tile  1 x  1 Round with Pin and Pin Hole
// 0 Name: 20482.dat
// 0 Author: Gerald Lasser [GeraldLasser]
// 0 !LDRAW_ORG Part UPDATE 2015-01
// 0 !LICENSE Licensed under CC BY 2.0 and CC BY 4.0 : see CAreadme.txt
// 
// 0 !HELP Holder for 2 LDU wide Stalks
// 
// 0 BFC CERTIFY CCW
  [0,"BFC","CERTIFY"],
  [0,"BFC","CCW"],
// 
// 0 !KEYWORDS Friends
// 
// 0 !HISTORY 2015-10-11 [PTadmin] Official Update 2015-01
// 
// 
// 1 16 0 8 0 2 0 0 0 -1 0 0 0 2 4-4ring3.dat
  [1,16,0,8,0,2,0,0,0,-1,0,0,0,2, ldraw_lib__4_4ring3()],
// 1 16 0 8 0 2 0 0 0 -1 0 0 0 2 4-4ring4.dat
  [1,16,0,8,0,2,0,0,0,-1,0,0,0,2, ldraw_lib__4_4ring4()],
// 0 BFC INVERTNEXT
  [0,"BFC","INVERTNEXT"],
// 1 16 0 4 0 6 0 0 0 4 0 0 0 6 4-4cylo.dat
  [1,16,0,4,0,6,0,0,0,4,0,0,0,6, ldraw_lib__4_4cylo()],
// 1 16 0 4 0 2 0 0 0 -1 0 0 0 2 4-4ring1.dat
  [1,16,0,4,0,2,0,0,0,-1,0,0,0,2, ldraw_lib__4_4ring1()],
// 1 16 0 4 0 2 0 0 0 -1 0 0 0 2 4-4ring2.dat
  [1,16,0,4,0,2,0,0,0,-1,0,0,0,2, ldraw_lib__4_4ring2()],
// 0 BFC INVERTNEXT
  [0,"BFC","INVERTNEXT"],
// 1 16 0 -8 0 2 0 0 0 12 0 0 0 2 4-4cylo.dat
  [1,16,0,-8,0,2,0,0,0,12,0,0,0,2, ldraw_lib__4_4cylo()],
// 1 16 0 0 0 10 0 0 0 8 0 0 0 10 4-4cylo.dat
  [1,16,0,0,0,10,0,0,0,8,0,0,0,10, ldraw_lib__4_4cylo()],
// 1 16 0 0 0 4 0 0 0 1 0 0 0 4 4-4ring1.dat
  [1,16,0,0,0,4,0,0,0,1,0,0,0,4, ldraw_lib__4_4ring1()],
// 1 16 0 0 0 2 0 0 0 1 0 0 0 2 4-4ring4.dat
  [1,16,0,0,0,2,0,0,0,1,0,0,0,2, ldraw_lib__4_4ring4()],
// 1 16 0 -8 0 4 0 0 0 8 0 0 0 4 4-4cylo.dat
  [1,16,0,-8,0,4,0,0,0,8,0,0,0,4, ldraw_lib__4_4cylo()],
// 1 16 0 -8 0 2 0 0 0 1 0 0 0 2 4-4ring1.dat
  [1,16,0,-8,0,2,0,0,0,1,0,0,0,2, ldraw_lib__4_4ring1()],
];
makepoly(ldraw_lib__20482(), line=0.2);
// main file
use <../lib.scad>
use <20482.scad>
function ldraw_lib__31561() = [
// 0 =Tile  1 x  1 Round with Pin and Pin Hole
// 0 Name: 31561.dat
// 0 Author: Magnus Forsberg [MagFors]
// 0 !LDRAW_ORG Part Alias UPDATE 2020-01
// 0 !LICENSE Licensed under CC BY 2.0 and CC BY 4.0 : see CAreadme.txt
// 
// 0 BFC CERTIFY CCW
  [0,"BFC","CERTIFY"],
  [0,"BFC","CCW"],
// 
// 0 !HISTORY 2020-06-28 [PTadmin] Official Update 2020-01
// 
// 
// 1 16 0 0 0 1 0 0 0 1 0 0 0 1 20482.dat
  [1,16,0,0,0,1,0,0,0,1,0,0,0,1, ldraw_lib__20482()],
];
makepoly(ldraw_lib__31561(), line=0.2);
